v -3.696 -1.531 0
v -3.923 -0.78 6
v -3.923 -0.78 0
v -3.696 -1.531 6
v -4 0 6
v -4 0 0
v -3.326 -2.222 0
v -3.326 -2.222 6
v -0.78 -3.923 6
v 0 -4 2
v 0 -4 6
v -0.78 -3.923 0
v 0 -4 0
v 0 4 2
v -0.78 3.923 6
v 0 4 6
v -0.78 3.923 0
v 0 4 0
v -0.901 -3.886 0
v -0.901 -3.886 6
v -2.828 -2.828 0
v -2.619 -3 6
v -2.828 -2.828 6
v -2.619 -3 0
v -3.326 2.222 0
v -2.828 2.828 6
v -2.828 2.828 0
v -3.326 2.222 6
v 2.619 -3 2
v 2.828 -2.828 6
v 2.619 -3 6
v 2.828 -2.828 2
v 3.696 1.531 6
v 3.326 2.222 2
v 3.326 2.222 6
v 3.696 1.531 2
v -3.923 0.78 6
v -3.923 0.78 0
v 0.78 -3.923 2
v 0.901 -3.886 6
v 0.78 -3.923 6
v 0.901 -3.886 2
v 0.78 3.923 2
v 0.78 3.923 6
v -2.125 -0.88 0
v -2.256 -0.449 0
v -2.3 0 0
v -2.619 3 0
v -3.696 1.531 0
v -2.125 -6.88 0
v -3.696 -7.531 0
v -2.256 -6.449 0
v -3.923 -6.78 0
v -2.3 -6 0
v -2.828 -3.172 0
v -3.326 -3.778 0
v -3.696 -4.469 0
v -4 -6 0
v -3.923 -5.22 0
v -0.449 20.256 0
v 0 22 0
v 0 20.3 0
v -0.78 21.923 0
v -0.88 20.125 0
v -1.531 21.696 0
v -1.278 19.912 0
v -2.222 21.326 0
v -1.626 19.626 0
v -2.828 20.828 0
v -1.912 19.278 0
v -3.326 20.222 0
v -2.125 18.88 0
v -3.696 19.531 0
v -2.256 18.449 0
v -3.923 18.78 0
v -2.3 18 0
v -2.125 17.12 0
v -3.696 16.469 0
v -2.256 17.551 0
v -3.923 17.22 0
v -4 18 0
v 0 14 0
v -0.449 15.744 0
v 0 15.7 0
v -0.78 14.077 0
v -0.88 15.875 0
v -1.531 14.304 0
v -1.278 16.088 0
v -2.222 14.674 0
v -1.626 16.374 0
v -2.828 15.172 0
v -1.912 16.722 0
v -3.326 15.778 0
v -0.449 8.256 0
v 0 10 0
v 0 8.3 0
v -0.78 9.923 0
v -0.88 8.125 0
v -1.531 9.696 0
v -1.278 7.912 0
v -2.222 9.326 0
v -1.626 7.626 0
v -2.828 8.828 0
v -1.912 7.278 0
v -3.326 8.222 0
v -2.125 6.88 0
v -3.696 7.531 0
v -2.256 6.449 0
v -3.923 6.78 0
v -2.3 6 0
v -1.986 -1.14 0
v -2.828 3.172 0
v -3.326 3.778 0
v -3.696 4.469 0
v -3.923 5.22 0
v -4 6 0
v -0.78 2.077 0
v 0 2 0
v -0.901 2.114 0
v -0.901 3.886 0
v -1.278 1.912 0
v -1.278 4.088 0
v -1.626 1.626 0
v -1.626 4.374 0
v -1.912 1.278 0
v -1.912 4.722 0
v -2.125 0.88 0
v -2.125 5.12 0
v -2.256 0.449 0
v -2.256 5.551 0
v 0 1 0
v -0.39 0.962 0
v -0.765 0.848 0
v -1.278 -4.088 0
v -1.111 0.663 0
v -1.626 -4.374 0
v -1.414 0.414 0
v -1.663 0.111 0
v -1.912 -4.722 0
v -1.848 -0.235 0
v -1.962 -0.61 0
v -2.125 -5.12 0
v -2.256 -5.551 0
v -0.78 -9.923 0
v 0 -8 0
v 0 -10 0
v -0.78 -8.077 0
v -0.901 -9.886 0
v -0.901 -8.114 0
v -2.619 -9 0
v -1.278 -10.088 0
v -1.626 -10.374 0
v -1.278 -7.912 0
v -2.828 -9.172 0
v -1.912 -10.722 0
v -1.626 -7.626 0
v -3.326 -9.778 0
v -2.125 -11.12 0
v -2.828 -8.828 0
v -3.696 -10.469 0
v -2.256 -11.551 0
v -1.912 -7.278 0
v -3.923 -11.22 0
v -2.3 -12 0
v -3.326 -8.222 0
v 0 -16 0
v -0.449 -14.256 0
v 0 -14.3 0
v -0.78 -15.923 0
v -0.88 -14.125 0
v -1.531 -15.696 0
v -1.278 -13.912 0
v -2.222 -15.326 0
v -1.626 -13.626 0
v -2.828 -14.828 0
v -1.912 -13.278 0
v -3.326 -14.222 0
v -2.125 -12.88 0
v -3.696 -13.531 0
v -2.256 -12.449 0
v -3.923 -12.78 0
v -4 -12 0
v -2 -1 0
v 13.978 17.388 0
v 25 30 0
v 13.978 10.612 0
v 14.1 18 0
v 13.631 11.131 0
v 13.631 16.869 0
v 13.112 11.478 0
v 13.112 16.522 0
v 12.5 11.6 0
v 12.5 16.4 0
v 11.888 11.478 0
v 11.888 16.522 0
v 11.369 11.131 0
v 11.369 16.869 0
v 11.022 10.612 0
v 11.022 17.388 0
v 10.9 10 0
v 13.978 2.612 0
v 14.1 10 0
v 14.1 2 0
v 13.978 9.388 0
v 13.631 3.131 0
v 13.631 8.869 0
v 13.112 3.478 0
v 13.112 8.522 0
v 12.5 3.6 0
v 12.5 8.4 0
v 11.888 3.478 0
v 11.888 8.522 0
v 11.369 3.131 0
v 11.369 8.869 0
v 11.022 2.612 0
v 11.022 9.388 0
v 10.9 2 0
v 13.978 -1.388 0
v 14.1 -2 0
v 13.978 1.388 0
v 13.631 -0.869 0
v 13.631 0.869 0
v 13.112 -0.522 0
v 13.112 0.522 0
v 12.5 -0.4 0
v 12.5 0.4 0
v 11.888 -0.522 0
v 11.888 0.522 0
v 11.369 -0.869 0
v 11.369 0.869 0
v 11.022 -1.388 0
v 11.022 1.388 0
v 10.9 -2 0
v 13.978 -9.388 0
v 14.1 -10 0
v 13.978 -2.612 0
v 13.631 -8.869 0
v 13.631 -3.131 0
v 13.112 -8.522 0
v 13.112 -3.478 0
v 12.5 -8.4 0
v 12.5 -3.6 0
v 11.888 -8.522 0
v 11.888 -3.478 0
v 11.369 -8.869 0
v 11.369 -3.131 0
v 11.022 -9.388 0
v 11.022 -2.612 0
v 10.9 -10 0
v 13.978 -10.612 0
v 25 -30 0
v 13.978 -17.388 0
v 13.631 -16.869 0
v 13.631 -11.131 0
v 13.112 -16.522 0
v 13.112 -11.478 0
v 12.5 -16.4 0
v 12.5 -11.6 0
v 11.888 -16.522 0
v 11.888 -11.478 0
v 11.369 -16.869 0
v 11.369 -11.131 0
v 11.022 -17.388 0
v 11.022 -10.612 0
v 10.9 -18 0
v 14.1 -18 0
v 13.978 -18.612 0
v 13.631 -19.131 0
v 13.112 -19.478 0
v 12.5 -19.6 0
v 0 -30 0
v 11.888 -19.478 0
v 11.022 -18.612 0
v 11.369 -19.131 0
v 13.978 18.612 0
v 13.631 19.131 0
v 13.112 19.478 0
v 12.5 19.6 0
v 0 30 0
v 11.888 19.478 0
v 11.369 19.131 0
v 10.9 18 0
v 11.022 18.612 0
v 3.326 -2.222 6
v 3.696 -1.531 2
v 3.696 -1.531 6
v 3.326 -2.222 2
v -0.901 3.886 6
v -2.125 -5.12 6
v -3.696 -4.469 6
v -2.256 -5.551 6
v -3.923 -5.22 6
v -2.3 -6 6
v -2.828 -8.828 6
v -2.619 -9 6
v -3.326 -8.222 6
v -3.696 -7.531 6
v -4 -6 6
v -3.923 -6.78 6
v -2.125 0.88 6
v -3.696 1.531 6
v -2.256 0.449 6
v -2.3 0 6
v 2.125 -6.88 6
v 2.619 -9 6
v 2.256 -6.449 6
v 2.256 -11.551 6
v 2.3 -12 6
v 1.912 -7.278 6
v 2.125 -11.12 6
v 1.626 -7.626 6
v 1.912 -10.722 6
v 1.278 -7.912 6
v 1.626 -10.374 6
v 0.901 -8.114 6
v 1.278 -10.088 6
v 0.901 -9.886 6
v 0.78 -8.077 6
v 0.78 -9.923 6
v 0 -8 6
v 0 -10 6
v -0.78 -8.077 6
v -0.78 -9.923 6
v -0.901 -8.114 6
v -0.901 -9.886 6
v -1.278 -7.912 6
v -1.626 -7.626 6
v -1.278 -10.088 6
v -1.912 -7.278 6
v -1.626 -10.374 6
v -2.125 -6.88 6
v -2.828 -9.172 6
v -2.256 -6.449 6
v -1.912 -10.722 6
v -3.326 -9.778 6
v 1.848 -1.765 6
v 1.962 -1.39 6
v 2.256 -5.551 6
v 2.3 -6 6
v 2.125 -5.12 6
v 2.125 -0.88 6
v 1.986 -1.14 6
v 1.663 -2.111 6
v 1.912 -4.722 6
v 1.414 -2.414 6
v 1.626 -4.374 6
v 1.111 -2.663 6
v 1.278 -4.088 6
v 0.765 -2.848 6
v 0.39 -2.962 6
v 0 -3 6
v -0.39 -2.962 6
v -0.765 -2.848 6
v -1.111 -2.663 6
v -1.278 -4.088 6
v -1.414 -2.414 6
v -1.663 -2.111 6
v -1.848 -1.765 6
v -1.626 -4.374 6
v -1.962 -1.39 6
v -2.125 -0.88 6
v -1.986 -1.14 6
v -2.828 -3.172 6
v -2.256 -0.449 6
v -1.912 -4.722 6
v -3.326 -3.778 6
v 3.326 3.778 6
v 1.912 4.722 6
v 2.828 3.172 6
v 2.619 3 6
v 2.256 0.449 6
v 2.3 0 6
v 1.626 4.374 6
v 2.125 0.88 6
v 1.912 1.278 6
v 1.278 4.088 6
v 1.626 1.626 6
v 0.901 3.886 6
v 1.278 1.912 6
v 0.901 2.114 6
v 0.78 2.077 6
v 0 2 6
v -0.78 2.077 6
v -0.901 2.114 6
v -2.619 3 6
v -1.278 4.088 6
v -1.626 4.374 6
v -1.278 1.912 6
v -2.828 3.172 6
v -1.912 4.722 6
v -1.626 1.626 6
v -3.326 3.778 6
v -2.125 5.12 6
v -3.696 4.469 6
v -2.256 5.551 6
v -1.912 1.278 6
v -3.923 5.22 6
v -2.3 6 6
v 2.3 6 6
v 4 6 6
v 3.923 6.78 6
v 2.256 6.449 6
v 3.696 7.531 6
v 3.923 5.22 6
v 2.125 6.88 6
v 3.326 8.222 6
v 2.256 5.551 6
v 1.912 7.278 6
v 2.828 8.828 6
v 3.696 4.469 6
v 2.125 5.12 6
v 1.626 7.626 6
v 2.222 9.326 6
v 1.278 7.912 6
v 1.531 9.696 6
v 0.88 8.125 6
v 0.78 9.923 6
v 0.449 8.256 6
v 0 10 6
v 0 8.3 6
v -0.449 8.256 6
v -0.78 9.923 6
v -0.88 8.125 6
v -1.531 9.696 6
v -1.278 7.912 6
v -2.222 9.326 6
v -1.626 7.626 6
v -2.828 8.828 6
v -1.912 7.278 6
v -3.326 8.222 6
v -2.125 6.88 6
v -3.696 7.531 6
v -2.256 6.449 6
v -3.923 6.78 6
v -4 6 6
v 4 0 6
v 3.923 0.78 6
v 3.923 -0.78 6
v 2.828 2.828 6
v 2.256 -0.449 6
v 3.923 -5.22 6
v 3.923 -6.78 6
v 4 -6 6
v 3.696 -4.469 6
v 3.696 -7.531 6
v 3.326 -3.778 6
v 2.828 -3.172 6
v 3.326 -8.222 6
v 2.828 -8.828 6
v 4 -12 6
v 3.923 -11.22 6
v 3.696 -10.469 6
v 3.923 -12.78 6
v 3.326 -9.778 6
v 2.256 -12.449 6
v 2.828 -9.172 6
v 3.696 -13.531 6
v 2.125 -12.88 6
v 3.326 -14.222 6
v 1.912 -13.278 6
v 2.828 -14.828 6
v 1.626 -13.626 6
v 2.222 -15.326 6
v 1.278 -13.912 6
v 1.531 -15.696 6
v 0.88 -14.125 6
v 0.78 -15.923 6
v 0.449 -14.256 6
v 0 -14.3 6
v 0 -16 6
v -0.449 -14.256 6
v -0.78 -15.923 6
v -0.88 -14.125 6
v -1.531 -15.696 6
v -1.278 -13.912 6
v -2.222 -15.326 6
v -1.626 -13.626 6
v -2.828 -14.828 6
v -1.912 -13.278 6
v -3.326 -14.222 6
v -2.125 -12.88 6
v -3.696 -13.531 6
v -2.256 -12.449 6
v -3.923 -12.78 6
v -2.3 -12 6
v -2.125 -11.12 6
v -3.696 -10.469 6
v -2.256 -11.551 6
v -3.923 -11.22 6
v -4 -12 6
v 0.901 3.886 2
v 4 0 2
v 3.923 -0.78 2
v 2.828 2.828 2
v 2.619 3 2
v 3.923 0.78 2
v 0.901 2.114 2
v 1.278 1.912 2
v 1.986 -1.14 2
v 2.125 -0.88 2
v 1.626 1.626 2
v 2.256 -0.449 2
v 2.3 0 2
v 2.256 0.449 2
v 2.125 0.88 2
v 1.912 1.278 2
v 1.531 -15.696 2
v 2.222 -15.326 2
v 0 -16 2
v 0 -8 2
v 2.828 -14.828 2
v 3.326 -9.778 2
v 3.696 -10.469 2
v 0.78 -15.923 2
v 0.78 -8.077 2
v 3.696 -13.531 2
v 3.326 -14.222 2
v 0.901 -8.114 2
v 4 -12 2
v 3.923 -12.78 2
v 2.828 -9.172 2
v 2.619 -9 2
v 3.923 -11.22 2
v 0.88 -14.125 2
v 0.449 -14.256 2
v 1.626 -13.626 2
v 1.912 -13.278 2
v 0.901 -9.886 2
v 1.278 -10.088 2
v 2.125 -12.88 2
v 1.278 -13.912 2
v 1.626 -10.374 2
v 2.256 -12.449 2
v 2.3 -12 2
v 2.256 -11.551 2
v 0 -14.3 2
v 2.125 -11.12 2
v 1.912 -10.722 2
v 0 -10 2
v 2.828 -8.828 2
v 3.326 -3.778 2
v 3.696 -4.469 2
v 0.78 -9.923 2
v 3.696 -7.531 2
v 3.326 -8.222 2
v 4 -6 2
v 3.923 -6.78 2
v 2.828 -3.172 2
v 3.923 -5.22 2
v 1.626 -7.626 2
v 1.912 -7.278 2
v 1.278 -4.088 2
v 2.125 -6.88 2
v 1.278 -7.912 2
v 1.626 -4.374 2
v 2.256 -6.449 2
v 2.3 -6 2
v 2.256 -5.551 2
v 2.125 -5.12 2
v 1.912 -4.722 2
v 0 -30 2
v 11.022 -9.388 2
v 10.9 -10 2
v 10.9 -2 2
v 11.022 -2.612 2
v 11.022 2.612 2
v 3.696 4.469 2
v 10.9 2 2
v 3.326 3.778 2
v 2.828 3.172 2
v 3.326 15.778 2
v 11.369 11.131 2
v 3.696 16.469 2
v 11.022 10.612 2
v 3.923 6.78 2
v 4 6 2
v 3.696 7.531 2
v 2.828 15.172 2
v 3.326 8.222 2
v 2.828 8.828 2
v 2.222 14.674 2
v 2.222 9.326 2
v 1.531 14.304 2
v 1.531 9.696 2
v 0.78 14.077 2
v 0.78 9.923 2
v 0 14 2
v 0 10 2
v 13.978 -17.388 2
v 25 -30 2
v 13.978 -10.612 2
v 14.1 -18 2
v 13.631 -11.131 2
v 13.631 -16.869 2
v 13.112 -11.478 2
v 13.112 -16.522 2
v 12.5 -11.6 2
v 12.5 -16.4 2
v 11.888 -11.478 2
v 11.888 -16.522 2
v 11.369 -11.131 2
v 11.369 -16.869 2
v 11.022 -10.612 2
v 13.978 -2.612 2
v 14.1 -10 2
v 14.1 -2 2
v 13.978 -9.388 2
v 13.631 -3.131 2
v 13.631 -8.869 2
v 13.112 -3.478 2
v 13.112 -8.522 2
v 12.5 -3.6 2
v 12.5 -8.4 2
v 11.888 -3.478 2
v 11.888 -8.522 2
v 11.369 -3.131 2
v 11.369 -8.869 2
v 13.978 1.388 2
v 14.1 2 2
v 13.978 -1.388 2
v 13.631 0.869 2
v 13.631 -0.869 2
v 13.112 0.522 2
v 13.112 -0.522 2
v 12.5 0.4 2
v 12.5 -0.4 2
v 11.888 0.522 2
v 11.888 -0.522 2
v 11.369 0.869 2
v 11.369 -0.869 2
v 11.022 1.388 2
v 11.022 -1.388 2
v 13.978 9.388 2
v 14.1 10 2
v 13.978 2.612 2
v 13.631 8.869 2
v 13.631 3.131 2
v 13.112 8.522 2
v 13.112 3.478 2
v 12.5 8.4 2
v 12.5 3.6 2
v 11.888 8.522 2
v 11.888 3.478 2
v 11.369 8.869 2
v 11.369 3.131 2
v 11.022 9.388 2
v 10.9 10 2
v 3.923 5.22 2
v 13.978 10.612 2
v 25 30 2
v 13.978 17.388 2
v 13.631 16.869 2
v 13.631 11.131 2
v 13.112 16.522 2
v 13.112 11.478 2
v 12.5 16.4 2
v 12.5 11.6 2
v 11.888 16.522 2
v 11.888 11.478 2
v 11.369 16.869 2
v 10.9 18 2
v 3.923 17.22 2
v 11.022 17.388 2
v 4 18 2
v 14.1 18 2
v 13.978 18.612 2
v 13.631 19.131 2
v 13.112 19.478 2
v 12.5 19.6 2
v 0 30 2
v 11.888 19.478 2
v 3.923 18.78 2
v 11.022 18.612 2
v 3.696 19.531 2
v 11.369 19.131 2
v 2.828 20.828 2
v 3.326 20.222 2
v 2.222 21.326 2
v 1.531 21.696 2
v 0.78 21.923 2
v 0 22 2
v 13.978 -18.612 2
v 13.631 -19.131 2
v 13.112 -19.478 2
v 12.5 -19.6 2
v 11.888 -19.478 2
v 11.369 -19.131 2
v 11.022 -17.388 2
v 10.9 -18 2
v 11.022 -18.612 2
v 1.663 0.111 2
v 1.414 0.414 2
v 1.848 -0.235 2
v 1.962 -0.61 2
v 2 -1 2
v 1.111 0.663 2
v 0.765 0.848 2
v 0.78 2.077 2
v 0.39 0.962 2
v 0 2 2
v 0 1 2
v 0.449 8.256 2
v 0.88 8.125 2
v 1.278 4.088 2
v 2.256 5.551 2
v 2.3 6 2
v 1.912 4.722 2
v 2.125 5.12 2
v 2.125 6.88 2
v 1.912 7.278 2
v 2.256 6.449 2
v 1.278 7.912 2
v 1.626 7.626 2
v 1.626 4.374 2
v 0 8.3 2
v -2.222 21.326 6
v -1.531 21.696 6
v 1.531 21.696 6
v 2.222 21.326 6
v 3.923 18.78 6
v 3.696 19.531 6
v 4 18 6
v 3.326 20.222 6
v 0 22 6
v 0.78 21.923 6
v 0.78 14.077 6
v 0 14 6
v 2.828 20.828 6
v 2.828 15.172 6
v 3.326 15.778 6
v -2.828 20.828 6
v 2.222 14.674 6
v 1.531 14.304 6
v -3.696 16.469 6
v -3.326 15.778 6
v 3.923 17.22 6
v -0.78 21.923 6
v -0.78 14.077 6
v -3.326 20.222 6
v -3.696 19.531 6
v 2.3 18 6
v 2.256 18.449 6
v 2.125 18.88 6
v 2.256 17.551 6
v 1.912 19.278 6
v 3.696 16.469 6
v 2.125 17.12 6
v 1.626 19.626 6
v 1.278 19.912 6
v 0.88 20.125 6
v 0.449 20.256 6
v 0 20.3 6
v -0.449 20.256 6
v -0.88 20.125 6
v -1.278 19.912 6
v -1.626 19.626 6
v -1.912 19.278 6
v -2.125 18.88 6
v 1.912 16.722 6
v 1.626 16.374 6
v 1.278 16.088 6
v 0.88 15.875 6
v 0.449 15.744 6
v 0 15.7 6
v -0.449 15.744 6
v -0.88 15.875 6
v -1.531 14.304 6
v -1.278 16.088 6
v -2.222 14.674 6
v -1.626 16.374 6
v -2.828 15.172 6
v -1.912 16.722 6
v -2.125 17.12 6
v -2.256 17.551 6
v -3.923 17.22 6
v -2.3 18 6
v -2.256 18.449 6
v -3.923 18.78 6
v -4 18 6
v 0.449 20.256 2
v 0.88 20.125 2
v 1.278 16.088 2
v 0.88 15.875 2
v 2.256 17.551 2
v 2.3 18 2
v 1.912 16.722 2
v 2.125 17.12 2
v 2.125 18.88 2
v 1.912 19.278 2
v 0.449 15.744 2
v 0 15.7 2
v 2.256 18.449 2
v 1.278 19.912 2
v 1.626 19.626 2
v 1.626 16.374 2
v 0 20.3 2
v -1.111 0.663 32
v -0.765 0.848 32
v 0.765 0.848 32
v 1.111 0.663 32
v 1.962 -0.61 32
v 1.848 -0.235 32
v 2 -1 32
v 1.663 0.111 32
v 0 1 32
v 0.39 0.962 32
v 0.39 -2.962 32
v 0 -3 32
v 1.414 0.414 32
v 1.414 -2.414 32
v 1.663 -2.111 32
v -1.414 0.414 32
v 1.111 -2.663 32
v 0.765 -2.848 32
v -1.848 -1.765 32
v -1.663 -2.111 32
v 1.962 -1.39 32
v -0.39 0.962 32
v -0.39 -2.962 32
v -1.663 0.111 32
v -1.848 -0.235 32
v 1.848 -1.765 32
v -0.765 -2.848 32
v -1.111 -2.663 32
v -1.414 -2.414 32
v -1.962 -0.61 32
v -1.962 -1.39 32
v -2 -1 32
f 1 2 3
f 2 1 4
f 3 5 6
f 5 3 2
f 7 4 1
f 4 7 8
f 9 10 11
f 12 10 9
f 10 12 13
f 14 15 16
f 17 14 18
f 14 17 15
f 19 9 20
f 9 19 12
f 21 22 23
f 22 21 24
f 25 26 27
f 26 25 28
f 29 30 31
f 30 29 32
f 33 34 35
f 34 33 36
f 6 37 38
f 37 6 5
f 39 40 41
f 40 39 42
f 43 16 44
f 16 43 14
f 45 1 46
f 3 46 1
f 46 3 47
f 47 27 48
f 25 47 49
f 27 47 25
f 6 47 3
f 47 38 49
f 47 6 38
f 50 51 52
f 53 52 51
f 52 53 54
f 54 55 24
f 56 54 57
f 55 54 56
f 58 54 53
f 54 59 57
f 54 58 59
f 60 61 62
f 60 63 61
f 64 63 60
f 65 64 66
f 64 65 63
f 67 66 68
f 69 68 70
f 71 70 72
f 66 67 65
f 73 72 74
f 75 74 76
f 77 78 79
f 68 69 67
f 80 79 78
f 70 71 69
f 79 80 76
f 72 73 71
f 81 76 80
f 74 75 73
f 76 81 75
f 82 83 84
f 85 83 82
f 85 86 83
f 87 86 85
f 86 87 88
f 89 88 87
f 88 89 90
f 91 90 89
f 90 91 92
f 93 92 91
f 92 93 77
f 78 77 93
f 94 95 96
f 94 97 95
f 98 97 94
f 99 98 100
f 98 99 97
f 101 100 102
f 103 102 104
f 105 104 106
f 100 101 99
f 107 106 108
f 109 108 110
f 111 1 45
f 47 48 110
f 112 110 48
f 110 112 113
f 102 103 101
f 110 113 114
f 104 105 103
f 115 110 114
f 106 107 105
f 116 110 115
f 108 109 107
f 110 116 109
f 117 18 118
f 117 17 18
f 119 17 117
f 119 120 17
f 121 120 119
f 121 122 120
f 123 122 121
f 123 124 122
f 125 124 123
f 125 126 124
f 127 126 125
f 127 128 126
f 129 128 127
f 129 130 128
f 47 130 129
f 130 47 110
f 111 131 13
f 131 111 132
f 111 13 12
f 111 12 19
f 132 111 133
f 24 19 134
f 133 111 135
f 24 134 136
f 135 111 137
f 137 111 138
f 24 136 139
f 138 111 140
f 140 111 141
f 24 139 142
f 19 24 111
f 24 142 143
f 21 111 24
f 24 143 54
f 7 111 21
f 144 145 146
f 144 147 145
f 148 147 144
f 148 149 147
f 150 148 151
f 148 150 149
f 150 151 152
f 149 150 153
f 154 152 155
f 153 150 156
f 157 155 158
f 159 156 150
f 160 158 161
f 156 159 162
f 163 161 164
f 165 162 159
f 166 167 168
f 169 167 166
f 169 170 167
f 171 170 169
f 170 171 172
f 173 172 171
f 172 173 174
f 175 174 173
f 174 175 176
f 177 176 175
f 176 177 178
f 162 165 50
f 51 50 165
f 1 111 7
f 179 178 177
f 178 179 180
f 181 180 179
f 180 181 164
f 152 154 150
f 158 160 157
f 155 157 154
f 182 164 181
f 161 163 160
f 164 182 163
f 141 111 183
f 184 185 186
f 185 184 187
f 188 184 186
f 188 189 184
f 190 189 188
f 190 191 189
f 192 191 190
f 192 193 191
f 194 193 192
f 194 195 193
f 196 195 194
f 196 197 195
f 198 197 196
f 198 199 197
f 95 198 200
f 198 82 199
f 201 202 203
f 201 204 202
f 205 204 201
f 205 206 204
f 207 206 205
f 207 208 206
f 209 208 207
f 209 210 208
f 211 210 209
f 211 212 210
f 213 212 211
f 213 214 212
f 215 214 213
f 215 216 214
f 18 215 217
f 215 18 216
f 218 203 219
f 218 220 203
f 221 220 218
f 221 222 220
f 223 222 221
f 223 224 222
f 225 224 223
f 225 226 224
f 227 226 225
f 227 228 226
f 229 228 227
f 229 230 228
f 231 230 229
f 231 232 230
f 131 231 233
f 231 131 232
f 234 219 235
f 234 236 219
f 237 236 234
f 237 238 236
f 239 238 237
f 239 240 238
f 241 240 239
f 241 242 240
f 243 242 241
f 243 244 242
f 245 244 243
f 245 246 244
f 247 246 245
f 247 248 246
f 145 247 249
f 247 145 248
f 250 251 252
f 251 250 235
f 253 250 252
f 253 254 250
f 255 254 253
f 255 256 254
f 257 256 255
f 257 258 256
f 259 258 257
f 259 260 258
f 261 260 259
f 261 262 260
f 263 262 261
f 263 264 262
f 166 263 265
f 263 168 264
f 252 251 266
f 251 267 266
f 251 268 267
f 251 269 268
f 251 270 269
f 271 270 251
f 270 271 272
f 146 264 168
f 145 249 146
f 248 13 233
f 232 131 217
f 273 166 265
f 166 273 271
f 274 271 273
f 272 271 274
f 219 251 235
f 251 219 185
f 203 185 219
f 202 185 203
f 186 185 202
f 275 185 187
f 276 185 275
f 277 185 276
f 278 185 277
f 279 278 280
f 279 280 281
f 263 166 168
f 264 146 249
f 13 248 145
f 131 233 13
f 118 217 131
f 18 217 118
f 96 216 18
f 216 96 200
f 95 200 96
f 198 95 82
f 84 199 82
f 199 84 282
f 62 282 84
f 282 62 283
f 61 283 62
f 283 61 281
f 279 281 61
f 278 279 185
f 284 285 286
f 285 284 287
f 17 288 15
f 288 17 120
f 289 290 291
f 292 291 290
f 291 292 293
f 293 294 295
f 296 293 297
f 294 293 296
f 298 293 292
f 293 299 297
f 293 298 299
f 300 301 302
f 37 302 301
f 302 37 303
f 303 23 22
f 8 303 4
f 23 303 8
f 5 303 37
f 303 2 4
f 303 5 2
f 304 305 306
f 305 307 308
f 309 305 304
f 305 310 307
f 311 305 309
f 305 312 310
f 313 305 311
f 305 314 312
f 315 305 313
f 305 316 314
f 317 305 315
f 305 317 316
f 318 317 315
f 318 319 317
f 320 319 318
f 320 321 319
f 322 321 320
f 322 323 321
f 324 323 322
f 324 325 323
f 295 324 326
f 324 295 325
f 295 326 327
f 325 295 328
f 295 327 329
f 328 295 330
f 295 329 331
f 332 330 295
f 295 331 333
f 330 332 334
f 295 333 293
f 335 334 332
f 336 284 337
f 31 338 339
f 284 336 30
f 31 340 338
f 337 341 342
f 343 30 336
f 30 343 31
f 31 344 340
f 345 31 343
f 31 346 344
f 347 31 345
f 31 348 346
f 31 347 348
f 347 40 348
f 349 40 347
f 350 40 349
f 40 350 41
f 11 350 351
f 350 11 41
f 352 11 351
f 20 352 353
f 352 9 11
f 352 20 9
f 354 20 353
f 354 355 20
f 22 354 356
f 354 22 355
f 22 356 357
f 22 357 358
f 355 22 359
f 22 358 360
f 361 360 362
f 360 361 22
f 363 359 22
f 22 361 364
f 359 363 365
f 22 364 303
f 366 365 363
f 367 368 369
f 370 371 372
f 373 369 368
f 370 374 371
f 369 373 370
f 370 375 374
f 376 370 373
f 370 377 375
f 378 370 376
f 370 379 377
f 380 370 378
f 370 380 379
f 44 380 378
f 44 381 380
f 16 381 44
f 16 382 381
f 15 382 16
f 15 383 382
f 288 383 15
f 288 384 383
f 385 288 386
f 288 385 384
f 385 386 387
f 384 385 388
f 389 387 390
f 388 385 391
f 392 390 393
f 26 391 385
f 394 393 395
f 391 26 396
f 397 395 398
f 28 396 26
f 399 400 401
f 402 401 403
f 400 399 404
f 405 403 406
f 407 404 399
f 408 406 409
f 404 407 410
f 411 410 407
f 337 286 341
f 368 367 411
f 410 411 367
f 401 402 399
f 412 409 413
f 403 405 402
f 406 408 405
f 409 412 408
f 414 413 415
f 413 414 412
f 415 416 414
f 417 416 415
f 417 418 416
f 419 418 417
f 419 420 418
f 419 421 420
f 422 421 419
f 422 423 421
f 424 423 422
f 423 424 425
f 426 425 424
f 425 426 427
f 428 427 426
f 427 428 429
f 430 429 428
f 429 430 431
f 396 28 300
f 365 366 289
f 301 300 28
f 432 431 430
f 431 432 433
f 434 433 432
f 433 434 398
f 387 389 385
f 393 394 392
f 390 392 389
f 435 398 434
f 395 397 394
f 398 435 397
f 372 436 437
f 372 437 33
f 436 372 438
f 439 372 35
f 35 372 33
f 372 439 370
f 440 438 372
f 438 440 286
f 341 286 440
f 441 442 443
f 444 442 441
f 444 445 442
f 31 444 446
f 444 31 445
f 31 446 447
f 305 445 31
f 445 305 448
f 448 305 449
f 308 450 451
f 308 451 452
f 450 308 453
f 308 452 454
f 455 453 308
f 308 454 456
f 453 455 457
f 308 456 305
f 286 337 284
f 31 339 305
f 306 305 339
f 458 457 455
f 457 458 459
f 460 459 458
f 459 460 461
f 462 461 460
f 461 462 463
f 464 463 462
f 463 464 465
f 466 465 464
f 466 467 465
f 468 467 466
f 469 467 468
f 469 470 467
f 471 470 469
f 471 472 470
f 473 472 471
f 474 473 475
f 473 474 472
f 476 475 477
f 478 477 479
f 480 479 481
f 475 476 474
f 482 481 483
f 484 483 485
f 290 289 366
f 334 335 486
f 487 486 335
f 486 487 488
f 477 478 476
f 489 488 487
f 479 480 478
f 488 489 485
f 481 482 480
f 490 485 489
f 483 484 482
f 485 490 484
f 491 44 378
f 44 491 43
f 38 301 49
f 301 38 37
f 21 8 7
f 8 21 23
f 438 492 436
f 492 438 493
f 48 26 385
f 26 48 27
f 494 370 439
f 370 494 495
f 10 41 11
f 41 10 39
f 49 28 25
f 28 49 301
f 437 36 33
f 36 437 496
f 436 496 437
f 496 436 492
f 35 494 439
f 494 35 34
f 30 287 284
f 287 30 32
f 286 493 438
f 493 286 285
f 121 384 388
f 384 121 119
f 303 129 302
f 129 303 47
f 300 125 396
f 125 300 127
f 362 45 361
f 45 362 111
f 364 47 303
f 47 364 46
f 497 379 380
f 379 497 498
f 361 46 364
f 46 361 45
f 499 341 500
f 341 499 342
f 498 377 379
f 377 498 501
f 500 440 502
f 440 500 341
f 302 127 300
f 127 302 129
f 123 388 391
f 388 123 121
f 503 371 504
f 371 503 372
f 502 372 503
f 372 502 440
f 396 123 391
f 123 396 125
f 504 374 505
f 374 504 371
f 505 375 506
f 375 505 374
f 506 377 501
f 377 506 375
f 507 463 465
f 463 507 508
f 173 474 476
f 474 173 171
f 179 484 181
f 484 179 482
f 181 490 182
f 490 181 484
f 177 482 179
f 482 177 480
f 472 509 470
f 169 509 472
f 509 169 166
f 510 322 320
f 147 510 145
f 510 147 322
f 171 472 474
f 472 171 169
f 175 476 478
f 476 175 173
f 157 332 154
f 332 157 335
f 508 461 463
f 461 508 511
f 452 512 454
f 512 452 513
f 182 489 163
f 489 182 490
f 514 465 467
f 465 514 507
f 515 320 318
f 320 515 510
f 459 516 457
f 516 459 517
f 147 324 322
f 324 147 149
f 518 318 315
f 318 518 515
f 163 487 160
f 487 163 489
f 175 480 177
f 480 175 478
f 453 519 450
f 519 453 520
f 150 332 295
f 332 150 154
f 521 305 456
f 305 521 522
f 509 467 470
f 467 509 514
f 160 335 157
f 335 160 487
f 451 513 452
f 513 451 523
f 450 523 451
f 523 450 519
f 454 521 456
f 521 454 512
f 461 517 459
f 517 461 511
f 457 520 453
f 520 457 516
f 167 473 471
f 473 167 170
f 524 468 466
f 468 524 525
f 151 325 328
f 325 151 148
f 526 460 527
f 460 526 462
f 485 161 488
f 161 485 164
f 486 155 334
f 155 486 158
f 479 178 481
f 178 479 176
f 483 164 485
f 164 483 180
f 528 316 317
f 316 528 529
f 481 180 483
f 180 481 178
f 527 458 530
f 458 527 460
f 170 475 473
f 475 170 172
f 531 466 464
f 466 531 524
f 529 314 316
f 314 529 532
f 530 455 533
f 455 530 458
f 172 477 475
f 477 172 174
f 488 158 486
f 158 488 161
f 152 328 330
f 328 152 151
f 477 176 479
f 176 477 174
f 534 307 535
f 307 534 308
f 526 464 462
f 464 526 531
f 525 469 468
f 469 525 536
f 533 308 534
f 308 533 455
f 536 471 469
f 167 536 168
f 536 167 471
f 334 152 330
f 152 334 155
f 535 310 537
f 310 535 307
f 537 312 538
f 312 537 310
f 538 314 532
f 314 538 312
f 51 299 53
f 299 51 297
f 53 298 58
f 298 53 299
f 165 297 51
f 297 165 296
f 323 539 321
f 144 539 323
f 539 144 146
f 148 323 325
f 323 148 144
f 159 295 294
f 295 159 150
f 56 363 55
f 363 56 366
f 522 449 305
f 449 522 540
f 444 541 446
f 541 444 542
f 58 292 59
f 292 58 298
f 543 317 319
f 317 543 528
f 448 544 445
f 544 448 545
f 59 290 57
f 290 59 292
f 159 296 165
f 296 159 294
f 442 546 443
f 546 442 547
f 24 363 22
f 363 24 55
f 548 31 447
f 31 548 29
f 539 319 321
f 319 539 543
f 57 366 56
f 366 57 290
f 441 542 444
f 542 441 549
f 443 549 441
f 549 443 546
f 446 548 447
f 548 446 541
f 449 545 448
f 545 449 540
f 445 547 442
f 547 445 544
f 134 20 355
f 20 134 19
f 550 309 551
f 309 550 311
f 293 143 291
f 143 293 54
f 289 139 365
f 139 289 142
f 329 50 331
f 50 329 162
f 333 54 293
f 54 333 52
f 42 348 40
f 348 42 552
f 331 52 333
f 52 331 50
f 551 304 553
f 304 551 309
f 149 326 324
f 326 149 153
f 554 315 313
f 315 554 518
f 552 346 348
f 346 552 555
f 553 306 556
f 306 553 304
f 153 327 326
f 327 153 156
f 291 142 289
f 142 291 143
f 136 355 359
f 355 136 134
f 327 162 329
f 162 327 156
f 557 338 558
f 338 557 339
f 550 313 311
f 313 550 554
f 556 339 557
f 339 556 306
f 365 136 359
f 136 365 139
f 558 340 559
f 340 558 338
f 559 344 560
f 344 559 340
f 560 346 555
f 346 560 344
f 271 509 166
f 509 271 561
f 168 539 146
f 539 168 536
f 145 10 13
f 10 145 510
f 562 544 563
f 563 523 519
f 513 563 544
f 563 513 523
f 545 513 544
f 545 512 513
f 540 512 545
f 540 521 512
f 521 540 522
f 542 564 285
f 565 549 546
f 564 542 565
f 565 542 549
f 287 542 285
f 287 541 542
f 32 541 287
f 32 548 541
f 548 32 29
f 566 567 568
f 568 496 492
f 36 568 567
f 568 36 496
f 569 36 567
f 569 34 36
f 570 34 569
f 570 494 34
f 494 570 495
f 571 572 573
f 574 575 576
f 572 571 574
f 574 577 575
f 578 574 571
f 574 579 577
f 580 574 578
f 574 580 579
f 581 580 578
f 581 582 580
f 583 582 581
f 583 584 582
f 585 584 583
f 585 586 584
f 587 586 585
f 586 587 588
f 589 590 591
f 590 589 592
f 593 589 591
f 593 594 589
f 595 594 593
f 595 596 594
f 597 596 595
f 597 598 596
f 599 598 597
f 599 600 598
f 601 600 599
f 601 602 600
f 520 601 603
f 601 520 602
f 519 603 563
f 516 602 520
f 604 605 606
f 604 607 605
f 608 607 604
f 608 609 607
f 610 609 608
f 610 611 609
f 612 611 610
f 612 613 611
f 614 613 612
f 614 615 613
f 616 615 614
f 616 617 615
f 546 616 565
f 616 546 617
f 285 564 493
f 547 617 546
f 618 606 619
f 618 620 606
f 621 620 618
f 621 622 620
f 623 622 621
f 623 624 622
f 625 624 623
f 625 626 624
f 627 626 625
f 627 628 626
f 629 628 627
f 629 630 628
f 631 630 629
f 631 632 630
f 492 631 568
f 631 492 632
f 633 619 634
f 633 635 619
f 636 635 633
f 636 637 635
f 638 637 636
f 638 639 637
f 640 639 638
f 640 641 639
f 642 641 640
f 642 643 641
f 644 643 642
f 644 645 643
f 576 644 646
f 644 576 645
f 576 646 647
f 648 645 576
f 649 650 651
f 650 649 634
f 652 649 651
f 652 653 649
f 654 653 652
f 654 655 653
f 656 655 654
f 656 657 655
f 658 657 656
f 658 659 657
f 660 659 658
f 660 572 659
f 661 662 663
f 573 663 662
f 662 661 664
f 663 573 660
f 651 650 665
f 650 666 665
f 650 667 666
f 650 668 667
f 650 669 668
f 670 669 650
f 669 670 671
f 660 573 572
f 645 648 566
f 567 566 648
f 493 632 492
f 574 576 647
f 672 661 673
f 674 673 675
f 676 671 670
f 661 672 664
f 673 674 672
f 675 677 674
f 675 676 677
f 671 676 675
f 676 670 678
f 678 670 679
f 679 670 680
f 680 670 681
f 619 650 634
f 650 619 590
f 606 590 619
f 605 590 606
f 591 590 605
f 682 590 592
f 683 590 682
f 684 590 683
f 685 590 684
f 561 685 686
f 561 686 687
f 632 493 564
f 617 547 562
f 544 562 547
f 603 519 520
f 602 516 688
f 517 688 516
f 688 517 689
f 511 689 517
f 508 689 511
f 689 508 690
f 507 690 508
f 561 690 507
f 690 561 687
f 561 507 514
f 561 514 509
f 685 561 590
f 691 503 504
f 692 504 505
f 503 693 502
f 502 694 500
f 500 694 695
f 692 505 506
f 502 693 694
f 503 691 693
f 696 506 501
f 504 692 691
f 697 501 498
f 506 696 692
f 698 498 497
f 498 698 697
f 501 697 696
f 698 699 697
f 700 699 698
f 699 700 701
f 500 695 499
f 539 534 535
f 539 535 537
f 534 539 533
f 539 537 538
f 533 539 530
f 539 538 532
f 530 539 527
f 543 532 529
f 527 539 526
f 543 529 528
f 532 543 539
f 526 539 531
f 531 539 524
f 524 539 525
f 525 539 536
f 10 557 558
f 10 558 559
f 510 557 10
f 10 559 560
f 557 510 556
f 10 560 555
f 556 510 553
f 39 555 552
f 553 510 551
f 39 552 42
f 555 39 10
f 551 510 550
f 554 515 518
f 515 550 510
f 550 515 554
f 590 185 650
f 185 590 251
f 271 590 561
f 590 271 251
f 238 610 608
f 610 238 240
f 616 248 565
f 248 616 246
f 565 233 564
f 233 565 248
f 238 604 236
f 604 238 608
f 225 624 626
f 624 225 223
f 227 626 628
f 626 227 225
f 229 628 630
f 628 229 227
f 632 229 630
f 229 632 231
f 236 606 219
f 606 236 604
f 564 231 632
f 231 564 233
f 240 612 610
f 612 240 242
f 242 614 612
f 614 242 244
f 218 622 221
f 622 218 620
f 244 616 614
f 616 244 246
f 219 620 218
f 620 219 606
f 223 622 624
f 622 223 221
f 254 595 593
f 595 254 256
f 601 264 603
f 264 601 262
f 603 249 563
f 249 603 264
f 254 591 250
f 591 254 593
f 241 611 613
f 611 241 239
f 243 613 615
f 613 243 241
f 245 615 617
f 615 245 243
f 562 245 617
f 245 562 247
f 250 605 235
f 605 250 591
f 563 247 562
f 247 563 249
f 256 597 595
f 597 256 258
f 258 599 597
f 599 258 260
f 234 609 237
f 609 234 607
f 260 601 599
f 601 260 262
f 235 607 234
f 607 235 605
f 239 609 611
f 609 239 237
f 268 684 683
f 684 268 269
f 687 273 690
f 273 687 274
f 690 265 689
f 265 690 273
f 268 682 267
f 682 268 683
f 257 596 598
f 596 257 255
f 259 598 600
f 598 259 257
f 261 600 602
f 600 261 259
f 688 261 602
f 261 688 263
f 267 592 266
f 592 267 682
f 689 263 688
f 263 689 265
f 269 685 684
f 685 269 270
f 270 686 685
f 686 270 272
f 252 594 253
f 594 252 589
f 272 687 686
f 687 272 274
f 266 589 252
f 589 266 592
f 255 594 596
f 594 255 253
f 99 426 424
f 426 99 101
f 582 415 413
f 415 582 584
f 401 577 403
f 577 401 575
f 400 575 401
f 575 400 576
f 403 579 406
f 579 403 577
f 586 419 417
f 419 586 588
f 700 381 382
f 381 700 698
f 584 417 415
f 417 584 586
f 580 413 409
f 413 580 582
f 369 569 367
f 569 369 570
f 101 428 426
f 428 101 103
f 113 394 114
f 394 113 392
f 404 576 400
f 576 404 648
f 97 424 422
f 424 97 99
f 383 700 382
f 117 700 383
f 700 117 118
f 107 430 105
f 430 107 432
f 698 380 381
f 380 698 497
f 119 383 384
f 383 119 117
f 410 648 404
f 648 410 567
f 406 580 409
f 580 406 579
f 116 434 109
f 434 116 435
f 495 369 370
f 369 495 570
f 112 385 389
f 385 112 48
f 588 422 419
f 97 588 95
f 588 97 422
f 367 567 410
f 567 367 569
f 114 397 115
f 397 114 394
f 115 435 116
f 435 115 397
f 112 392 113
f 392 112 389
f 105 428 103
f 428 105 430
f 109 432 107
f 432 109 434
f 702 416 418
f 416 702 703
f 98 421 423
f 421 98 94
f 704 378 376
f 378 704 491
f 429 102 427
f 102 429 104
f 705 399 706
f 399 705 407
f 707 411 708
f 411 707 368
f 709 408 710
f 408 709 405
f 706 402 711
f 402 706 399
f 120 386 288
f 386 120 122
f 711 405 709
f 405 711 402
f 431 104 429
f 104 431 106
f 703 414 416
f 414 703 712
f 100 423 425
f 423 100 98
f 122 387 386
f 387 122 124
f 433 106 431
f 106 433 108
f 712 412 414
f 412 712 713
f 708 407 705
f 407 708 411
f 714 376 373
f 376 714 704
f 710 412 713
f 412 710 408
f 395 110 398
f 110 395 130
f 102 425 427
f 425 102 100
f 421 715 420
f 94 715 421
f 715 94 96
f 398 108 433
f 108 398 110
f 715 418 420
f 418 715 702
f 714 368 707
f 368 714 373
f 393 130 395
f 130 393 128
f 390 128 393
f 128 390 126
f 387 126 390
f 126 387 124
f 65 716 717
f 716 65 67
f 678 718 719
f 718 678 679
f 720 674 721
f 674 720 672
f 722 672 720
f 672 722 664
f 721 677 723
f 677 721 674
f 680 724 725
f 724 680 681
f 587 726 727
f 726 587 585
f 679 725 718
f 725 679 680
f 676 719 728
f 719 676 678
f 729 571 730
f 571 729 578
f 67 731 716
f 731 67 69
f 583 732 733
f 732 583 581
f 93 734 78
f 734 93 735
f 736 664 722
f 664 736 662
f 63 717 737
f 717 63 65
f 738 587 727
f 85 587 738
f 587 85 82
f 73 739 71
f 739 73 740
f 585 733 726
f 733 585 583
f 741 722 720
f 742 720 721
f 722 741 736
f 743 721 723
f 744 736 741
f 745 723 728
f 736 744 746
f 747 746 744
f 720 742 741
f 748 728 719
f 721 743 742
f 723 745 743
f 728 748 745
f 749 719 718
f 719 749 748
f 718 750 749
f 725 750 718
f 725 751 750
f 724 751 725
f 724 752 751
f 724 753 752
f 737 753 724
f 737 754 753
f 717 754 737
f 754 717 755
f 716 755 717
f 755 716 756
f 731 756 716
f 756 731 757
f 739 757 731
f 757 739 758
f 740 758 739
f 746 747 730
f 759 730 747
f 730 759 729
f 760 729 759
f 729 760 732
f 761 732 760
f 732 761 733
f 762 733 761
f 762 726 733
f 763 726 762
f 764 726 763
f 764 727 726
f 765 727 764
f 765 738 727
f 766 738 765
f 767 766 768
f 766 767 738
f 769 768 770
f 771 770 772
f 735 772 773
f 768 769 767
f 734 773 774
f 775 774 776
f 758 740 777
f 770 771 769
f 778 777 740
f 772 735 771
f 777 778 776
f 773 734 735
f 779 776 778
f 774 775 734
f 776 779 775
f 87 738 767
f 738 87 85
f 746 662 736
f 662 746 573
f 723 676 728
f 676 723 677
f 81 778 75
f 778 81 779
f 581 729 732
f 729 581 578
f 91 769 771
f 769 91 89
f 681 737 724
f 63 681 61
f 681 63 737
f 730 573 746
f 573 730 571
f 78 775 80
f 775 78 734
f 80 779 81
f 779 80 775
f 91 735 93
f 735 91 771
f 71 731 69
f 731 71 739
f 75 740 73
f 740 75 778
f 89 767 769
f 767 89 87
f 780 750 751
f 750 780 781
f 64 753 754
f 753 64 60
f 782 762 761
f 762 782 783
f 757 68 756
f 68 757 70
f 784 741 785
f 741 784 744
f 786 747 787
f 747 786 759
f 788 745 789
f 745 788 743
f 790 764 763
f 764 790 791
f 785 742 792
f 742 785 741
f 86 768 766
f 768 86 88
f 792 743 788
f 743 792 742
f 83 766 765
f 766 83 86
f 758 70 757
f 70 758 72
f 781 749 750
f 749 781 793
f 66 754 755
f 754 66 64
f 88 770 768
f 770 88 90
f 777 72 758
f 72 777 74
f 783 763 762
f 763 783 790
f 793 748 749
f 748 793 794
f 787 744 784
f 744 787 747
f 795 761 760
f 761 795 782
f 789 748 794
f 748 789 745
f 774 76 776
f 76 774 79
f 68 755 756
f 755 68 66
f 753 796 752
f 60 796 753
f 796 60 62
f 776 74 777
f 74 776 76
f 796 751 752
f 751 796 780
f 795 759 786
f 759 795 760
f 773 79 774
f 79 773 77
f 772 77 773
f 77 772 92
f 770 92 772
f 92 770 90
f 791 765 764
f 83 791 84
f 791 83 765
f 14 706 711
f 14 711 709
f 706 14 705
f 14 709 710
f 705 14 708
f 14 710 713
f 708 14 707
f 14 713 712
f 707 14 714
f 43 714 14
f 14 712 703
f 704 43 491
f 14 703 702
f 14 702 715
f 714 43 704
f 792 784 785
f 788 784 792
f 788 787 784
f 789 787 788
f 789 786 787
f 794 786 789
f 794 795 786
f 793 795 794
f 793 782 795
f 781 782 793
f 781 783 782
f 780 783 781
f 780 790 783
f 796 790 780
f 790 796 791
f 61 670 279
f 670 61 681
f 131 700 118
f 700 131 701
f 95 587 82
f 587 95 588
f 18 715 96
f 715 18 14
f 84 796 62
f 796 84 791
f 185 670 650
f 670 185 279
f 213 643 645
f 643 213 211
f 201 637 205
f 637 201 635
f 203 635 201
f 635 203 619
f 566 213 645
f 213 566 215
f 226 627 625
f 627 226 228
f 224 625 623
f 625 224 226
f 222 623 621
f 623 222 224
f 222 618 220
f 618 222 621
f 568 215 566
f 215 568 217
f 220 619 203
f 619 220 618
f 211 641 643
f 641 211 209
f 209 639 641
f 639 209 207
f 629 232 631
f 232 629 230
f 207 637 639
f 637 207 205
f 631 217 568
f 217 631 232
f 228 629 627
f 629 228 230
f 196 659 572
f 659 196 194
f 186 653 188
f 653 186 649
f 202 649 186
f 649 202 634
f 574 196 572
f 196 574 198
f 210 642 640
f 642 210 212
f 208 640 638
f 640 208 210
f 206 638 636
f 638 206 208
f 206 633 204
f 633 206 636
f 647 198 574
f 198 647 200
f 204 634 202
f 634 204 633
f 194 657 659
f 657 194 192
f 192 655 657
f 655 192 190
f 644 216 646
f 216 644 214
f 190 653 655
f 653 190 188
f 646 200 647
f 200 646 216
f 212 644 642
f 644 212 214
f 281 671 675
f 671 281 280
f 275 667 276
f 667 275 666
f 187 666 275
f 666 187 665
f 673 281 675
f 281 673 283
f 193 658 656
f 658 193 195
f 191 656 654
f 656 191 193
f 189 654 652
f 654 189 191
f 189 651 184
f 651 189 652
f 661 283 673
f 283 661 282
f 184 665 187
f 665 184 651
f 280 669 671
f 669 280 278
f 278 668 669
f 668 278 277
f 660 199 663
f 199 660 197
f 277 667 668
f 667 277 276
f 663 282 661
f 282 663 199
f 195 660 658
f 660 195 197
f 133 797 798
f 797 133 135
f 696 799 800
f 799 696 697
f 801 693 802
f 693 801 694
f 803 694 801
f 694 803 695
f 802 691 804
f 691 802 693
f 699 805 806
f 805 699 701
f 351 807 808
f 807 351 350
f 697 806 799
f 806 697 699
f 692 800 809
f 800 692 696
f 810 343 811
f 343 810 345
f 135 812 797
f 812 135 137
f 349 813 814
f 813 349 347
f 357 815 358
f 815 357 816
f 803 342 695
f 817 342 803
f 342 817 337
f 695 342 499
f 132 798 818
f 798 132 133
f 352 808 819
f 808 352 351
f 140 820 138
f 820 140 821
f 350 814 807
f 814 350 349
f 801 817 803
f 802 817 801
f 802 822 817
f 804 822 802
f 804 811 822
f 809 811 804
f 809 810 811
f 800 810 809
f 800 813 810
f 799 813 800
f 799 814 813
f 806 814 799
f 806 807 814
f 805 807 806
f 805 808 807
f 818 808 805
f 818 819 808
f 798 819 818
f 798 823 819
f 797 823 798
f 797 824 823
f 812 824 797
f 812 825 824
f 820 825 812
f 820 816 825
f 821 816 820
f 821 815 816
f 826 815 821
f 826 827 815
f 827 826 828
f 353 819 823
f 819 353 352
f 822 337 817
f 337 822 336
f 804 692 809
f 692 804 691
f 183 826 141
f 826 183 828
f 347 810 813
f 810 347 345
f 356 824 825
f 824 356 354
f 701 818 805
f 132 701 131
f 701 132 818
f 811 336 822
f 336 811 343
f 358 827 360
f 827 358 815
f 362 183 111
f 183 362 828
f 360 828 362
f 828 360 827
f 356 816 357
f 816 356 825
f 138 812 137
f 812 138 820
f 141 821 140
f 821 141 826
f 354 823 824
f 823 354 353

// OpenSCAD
// Butt Hinge Assembly - 180° Open State

// Parameters
leaf_length = 30;      // Y direction (along hinge axis)
leaf_width = 25;       // X direction (opening direction)
leaf_thickness = 2;
pin_diameter = 4;
pin_length = 32;
knuckle_outer_dia = 8;
knuckle_inner_dia = 4.6;
knuckle_width = 6;
clearance = 0.3;

// Module: Single leaf (flat plate)
module leaf() {
    cube([leaf_width, leaf_length, leaf_thickness], center=false);
}

// Module: Knuckle (cylindrical hinge element)
module knuckle() {
    difference() {
        cylinder(d=knuckle_outer_dia, h=knuckle_width, center=false, $fn=32);
        cylinder(d=knuckle_inner_dia, h=knuckle_width, center=false, $fn=32);
    }
}

// Module: Countersunk hole (M3)
module countersunk_hole(depth_countersink=1, dia_countersink=6, dia_hole=3.2) {
    union() {
        cylinder(d=dia_countersink, h=depth_countersink, center=false, $fn=16);
        cylinder(d=dia_hole, h=leaf_length, center=false, $fn=16);
    }
}

// Module: Left leaf with knuckles and countersunk holes
module left_leaf_assembly() {
    difference() {
        union() {
            // Base plate
            translate([-(leaf_width), 0, 0])
                leaf();
            
            // Knuckles: positions at Y = 0, 6, 12 mm
            // Left leaf has knuckles at outer positions and center
            for (y_pos = [0, 12]) {
                translate([0, y_pos, 0])
                    knuckle();
            }
            // Center knuckle
            translate([0, 6, 0])
                knuckle();
        }
        
        // Countersunk holes at Y = 2, 10, 18 mm (8mm spacing, away from knuckles)
        for (y_pos = [2, 10, 18]) {
            translate([-(leaf_width/2), y_pos, -(leaf_thickness)])
                countersunk_hole();
        }
    }
}

// Module: Right leaf with knuckles and countersunk holes
module right_leaf_assembly() {
    difference() {
        union() {
            // Base plate (mirrored position)
            leaf();
            
            // Knuckles: positions at Y = 6, 18 mm
            // Right leaf has knuckles at intermediate positions
            for (y_pos = [6, 18]) {
                translate([0, y_pos, 0])
                    knuckle();
            }
        }
        
        // Countersunk holes at Y = 2, 10, 18 mm (same spacing)
        for (y_pos = [2, 10, 18]) {
            translate([leaf_width/2, y_pos, -(leaf_thickness)])
                countersunk_hole();
        }
    }
}

// Module: Pin shaft (cylindrical)
module pin_shaft() {
    cylinder(d=pin_diameter, h=pin_length, center=false, $fn=32);
}

// Assembly
// Pin shaft along Y axis, centered at X=0
translate([0, -1, 0])
    pin_shaft();

// Left leaf: positioned at X negative, rotated 180° to open flat
// Knuckles at X=0, leaf extends to X negative
translate([0, 0, 0])
    rotate([0, 0, 180])
        translate([0, 0, 0])
            left_leaf_assembly();

// Right leaf: positioned at X positive, at Z=0 plane
// Knuckles at X=0, leaf extends to X positive
translate([0, 0, 0])
    right_leaf_assembly();
